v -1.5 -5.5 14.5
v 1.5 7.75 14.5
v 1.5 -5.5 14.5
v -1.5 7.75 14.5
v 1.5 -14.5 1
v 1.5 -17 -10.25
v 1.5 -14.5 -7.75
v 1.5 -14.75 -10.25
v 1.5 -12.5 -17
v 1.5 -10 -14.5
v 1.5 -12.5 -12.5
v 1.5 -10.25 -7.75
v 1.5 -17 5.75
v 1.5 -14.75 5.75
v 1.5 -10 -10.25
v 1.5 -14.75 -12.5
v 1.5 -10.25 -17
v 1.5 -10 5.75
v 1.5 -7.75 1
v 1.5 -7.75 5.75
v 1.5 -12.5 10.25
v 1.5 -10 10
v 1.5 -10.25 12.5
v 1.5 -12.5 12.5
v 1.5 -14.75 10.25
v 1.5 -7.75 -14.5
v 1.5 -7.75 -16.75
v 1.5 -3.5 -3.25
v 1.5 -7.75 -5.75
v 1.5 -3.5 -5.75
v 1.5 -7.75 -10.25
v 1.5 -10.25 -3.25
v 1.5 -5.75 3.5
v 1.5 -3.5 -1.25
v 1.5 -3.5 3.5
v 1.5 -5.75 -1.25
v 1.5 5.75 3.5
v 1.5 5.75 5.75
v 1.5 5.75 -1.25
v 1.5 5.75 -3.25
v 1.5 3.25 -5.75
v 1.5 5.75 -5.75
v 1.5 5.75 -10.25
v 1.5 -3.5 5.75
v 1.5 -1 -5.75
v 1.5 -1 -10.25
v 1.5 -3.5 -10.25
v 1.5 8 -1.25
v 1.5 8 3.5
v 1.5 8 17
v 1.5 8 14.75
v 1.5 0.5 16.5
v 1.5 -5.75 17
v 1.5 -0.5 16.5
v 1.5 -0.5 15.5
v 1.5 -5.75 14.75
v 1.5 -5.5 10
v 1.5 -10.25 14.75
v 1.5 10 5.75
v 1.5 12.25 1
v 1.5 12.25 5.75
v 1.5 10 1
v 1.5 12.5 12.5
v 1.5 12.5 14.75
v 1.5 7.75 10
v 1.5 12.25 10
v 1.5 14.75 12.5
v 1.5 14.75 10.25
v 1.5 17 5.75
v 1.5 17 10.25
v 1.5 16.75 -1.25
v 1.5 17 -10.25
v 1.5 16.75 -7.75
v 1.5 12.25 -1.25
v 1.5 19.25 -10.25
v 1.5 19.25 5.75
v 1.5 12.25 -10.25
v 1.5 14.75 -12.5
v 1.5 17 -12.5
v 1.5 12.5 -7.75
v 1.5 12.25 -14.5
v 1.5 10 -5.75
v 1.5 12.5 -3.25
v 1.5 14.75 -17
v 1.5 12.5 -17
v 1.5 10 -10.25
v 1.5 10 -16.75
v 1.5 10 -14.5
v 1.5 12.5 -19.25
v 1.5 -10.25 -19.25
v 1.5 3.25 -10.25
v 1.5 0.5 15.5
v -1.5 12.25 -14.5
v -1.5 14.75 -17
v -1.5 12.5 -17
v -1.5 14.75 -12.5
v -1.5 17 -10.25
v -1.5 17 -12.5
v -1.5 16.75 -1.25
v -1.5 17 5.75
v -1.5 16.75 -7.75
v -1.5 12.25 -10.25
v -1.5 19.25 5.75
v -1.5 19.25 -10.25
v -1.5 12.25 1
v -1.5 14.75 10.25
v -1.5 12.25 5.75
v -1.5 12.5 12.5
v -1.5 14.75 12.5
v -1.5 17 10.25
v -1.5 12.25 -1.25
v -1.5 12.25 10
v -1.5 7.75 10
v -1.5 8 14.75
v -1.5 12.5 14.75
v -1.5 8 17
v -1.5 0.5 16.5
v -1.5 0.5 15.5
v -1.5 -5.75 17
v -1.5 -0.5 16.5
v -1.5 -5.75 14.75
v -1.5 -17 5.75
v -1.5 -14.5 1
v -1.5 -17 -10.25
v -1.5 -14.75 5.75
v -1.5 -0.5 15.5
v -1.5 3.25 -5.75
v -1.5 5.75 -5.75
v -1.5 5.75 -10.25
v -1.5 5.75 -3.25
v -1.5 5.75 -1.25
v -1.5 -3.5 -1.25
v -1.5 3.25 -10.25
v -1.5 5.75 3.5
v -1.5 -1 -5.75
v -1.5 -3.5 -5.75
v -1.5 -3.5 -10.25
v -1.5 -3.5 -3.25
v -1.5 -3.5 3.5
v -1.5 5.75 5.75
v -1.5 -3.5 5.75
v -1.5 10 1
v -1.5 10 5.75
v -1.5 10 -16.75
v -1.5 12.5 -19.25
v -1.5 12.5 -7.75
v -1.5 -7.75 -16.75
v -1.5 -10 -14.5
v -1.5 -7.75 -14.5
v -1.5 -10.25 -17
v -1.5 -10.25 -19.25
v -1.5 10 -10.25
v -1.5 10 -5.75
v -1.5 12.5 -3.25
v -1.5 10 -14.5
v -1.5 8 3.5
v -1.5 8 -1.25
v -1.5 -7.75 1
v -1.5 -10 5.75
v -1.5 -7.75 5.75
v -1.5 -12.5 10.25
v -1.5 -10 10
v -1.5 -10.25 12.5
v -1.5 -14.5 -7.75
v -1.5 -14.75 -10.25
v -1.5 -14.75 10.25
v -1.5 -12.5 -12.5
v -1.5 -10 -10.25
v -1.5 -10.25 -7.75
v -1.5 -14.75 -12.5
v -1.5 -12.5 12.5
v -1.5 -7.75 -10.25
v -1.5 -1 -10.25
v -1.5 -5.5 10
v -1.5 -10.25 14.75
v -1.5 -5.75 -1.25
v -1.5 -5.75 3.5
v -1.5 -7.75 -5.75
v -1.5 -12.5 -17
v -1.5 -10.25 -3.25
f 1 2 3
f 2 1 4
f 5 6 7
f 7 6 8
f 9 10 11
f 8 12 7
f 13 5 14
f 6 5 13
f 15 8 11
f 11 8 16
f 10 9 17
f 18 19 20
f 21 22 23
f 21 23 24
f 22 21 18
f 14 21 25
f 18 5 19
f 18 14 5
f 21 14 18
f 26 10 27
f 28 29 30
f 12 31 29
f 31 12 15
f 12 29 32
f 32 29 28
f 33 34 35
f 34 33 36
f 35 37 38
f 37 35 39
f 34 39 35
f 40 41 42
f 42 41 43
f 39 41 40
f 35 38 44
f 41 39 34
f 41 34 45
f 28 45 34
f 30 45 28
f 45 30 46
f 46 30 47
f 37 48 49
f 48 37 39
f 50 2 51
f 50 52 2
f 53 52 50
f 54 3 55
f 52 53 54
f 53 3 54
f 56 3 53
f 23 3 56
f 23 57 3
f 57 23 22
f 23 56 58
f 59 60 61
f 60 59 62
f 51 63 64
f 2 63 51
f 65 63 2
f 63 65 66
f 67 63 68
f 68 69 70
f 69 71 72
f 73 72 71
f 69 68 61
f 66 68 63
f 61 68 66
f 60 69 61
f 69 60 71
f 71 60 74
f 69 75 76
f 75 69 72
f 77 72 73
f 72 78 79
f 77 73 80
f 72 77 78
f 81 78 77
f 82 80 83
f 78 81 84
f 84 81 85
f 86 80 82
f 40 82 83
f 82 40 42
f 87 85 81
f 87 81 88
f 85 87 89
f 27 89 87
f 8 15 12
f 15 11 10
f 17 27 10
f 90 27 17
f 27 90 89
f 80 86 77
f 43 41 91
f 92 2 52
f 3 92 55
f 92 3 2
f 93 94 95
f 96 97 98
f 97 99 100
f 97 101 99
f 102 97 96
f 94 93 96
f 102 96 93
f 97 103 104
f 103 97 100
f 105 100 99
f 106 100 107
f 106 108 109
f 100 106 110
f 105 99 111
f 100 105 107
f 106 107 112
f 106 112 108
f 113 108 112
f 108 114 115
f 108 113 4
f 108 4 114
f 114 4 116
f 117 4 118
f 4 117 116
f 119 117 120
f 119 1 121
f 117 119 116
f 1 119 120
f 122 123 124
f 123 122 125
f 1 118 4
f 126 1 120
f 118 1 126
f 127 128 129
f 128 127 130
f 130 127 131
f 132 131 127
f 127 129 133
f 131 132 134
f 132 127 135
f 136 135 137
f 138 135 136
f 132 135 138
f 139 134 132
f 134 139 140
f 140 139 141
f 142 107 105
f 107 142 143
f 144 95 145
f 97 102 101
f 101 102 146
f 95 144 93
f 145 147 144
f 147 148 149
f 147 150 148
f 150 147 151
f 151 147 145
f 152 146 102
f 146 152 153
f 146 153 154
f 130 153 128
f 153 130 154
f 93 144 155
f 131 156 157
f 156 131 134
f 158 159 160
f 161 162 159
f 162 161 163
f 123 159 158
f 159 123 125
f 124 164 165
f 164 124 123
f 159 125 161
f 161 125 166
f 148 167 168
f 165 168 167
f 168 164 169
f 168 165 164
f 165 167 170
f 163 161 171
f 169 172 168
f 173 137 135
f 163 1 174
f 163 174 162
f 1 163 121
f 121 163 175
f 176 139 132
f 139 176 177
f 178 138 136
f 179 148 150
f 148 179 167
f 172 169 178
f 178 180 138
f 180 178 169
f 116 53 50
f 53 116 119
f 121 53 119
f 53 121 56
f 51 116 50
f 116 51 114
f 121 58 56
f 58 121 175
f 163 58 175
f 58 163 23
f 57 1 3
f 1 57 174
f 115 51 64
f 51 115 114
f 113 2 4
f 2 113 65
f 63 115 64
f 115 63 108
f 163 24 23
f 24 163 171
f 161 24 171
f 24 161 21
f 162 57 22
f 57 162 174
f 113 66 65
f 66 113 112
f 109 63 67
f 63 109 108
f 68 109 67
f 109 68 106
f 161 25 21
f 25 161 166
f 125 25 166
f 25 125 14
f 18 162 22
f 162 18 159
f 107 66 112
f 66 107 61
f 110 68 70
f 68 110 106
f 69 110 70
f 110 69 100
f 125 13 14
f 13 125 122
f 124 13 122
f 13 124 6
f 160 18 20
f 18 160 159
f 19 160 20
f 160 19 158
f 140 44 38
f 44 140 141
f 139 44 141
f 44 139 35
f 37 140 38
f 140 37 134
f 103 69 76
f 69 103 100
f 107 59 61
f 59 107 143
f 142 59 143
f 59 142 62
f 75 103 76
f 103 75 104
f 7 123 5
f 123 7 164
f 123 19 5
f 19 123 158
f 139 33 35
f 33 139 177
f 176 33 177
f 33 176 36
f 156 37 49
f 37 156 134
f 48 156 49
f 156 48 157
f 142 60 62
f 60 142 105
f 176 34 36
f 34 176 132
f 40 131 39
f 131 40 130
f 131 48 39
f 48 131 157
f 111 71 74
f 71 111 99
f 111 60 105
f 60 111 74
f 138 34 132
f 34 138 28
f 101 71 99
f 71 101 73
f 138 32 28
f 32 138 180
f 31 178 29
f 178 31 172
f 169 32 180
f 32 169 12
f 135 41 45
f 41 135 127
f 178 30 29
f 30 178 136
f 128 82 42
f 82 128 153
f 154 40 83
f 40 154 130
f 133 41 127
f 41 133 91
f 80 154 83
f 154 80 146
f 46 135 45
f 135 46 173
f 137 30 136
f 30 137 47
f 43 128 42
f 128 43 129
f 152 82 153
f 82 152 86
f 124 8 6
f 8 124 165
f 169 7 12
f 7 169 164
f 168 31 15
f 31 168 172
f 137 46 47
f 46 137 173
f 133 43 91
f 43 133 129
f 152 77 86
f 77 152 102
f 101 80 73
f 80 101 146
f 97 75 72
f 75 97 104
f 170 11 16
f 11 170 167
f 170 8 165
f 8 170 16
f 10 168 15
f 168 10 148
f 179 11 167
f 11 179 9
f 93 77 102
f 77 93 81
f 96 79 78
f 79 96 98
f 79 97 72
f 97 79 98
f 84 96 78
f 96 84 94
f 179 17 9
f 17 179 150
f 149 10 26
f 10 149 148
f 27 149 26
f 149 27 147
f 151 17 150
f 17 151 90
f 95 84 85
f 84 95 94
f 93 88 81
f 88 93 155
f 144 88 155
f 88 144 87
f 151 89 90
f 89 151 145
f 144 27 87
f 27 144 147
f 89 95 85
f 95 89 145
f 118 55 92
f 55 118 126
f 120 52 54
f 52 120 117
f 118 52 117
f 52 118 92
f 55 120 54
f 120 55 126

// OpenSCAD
shape = 6;//[0:Custom,1:SpaceShip,2:Alien1,3:SpaceInvader,4:Heart,5:Bow,6:Mushroom,7:Skull,8:WaitCursor,9:Pacman1,10:Pacman2,11:Potion,12:QuestionMark]

Custom = "[[0,0,0]]";

//Size of the pixel art object
objectSize = 50; 
//Thickness of the pixel art object
objectThickness = 3; 

gridRows = 2*10; //can't find a better to to get the customizer to ignore it 

//Pixel Width
unitWidth = objectSize / gridRows;

holeSize = 1; //resize hole if you set it to 0 there will be no hole
holeLocation = 0; //Change this to move the hole up or down (positive = down, negative = up)
unitLength = unitWidth;
distance = unitWidth;

//Shapes

SpaceShip1 = [[-5,-3,0],[-5,3,0],[-4,-2,0],[-4,2,0],[-3,-1,0],[-3,0,0],[-3,1,0],[-2,-2,0],[-2,-1,0],[-2,0,0],[-2,1,0],[-2,2,0],[-1,-3,0],[-1,-2,0],[-1,-1,0],[-1,0,0],[-1,1,0],[-1,2,0],[-1,3,0],[0,-5,0],[0,-4,0],[0,-3,0],[0,-1,0],[0,1,0],[0,3,0],[0,4,0],[0,5,0],[1,-3,0],[1,-2,0],[1,-1,0],[1,0,0],[1,1,0],[1,2,0],[1,3,0],[2,-2,0],[2,-1,0],[2,0,0],[2,1,0],[2,2,0],[3,-1,0],[3,0,0],[3,1,0],[4,-2,0],[4,2,0],[5,-3,0],[5,3,0]];

Alien1 =[[-6,-2,0],[-6,-1,0],[-6,0,0],[-6,1,0],[-6,2,0],[-5,-2,0],[-5,0,0],[-5,2,0],[-4,-2,0],[-4,-1,0],[-4,0,0],[-4,1,0],[-4,2,0],[-3,0,0],[-2,-3,0],[-2,-2,0],[-2,-1,0],[-2,0,0],[-2,1,0],[-2,2,0],[-2,3,0],[-1,-4,0],[-1,-3,0],[-1,-1,0],[-1,0,0],[-1,1,0],[-1,3,0],[-1,4,0],[0,-4,0],[0,-1,0],[0,0,0],[0,1,0],[0,4,0],[1,-5,0],[1,-4,0],[1,-1,0],[1,0,0],[1,1,0],[1,4,0],[1,5,0],[2,-5,0],[2,-1,0],[2,0,0],[2,1,0],[2,5,0],[3,-1,0],[3,0,0],[3,1,0],[4,-3,0],[4,-2,0],[4,-1,0],[4,0,0],[4,1,0],[4,2,0],[4,3,0],[5,-3,0],[5,3,0],[6,-3,0],[6,3,0],[7,-5,0],[7,-4,0],[7,-3,0],[7,3,0],[7,4,0],[7,5,0]];

Alien2 = [[-4,-4,0],[-4,4,0],[-3,-3,0],[-3,3,0],[-2,-4,0],[-2,-3,0],[-2,-2,0],[-2,-1,0],[-2,0,0],[-2,1,0],[-2,2,0],[-2,3,0],[-2,4,0],[-1,-4,0],[-1,-1,0],[-1,0,0],[-1,1,0],[-1,4,0],[0,-4,0],[0,-1,0],[0,0,0],[0,1,0],[0,4,0],[1,-5,0],[1,-4,0],[1,-1,0],[1,0,0],[1,1,0],[1,4,0],[1,5,0],[2,-6,0],[2,-5,0],[2,-4,0],[2,-3,0],[2,-2,0],[2,-1,0],[2,0,0],[2,1,0],[2,2,0],[2,3,0],[2,4,0],[2,5,0],[2,6,0],[3,-7,0],[3,-6,0],[3,-5,0],[3,-4,0],[3,-3,0],[3,-2,0],[3,-1,0],[3,0,0],[3,1,0],[3,2,0],[3,3,0],[3,4,0],[3,5,0],[3,6,0],[3,7,0],[4,-7,0],[4,-4,0],[4,-3,0],[4,-2,0],[4,-1,0],[4,0,0],[4,1,0],[4,2,0],[4,3,0],[4,4,0],[4,7,0],[5,-7,0],[5,-4,0],[5,4,0],[5,7,0],[6,-3,0],[6,3,0],[7,-2,0],[7,-1,0],[7,1,0],[7,2,0]];


Heart = [[-2,-4,0],[-2,-3,0],[-2,-2,0],[-2,2,0],[-2,3,0],[-2,4,0],[-1,-5,0],[-1,-4,0],[-1,-2,0],[-1,-1,0],[-1,1,0],[-1,2,0],[-1,3,0],[-1,4,0],[-1,5,0],[0,-5,0],[0,-3,0],[0,-2,0],[0,-1,0],[0,0,0],[0,1,0],[0,2,0],[0,3,0],[0,4,0],[0,5,0],[1,-5,0],[1,-3,0],[1,-2,0],[1,-1,0],[1,0,0],[1,1,0],[1,2,0],[1,3,0],[1,4,0],[1,5,0],[2,-5,0],[2,-4,0],[2,-3,0],[2,-2,0],[2,-1,0],[2,0,0],[2,1,0],[2,2,0],[2,3,0],[2,4,0],[2,5,0],[3,-4,0],[3,-3,0],[3,-2,0],[3,-1,0],[3,0,0],[3,1,0],[3,2,0],[3,3,0],[3,4,0],[4,-3,0],[4,-2,0],[4,-1,0],[4,0,0],[4,1,0],[4,2,0],[4,3,0],[5,-2,0],[5,-1,0],[5,0,0],[5,1,0],[5,2,0],[6,-1,0],[6,0,0],[6,1,0],[7,0,0]];

Mushroom1 = [[-9,-2,0],[-9,-1,0],[-9,0,0],[-9,1,0],[-9,2,0],[-9,3,0],[-8,-4,0],[-8,-3,0],[-8,-2,0],[-8,-1,0],[-8,2,0],[-8,3,0],[-8,4,0],[-8,5,0],[-7,-5,0],[-7,-4,0],[-7,-3,0],[-7,-2,0],[-7,-1,0],[-7,2,0],[-7,3,0],[-7,4,0],[-7,5,0],[-7,6,0],[-6,-6,0],[-6,-5,0],[-6,-3,0],[-6,-2,0],[-6,3,0],[-6,4,0],[-6,6,0],[-6,7,0],[-5,-6,0],[-5,7,0],[-4,-7,0],[-4,-6,0],[-4,-5,0],[-4,6,0],[-4,7,0],[-4,8,0],[-3,-7,0],[-3,-6,0],[-3,-5,0],[-3,-4,0],[-3,5,0],[-3,6,0],[-3,7,0],[-3,8,0],[-2,-7,0],[-2,-6,0],[-2,-5,0],[-2,-4,0],[-2,-1,0],[-2,0,0],[-2,1,0],[-2,2,0],[-2,5,0],[-2,6,0],[-2,7,0],[-2,8,0],[-1,-7,0],[-1,-6,0],[-1,-5,0],[-1,-1,0],[-1,0,0],[-1,1,0],[-1,2,0],[-1,6,0],[-1,7,0],[-1,8,0],[0,-7,0],[0,-6,0],[0,-5,0],[0,-2,0],[0,-1,0],[0,0,0],[0,1,0],[0,2,0],[0,3,0],[0,6,0],[0,7,0],[0,8,0],[1,-7,0],[1,-1,0],[1,0,0],[1,1,0],[1,2,0],[1,8,0],[2,-7,0],[2,-4,0],[2,-3,0],[2,-2,0],[2,-1,0],[2,0,0],[2,1,0],[2,2,0],[2,3,0],[2,4,0],[2,5,0],[2,8,0],[3,-7,0],[3,-4,0],[3,-1,0],[3,2,0],[3,5,0],[3,8,0],[4,-7,0],[4,-6,0],[4,-5,0],[4,-1,0],[4,2,0],[4,6,0],[4,7,0],[4,8,0],[5,-6,0],[5,-5,0],[5,6,0],[5,7,0],[6,-5,0],[6,6,0],[7,-5,0],[7,-4,0],[7,5,0],[7,6,0],[8,-4,0],[8,-3,0],[8,-2,0],[8,-1,0],[8,0,0],[8,1,0],[8,2,0],[8,3,0],[8,4,0],[8,5,0]];;

Mushroom2 = [[-7,-2,0],[-7,-1,0],[-7,0,0],[-7,1,0],[-7,2,0],[-7,3,0],[-6,-4,0],[-6,-3,0],[-6,4,0],[-6,5,0],[-5,-5,0],[-5,-4,0],[-5,-3,0],[-5,4,0],[-5,5,0],[-5,6,0],[-4,-6,0],[-4,-5,0],[-4,6,0],[-4,7,0],[-3,-6,0],[-3,-5,0],[-3,6,0],[-3,7,0],[-2,-7,0],[-2,-6,0],[-2,-5,0],[-2,-4,0],[-2,-1,0],[-2,0,0],[-2,1,0],[-2,2,0],[-2,5,0],[-2,6,0],[-2,7,0],[-2,8,0],[-1,-7,0],[-1,-6,0],[-1,-5,0],[-1,-4,0],[-1,-2,0],[-1,-1,0],[-1,0,0],[-1,1,0],[-1,2,0],[-1,3,0],[-1,5,0],[-1,6,0],[-1,7,0],[-1,8,0],[0,-7,0],[0,-2,0],[0,-1,0],[0,0,0],[0,1,0],[0,2,0],[0,3,0],[0,6,0],[0,7,0],[0,8,0],[1,-7,0],[1,-1,0],[1,0,0],[1,1,0],[1,2,0],[1,8,0],[2,-7,0],[2,-4,0],[2,-3,0],[2,-2,0],[2,-1,0],[2,0,0],[2,1,0],[2,2,0],[2,3,0],[2,4,0],[2,5,0],[2,8,0],[3,-7,0],[3,-4,0],[3,-1,0],[3,2,0],[3,5,0],[3,8,0],[4,-7,0],[4,-6,0],[4,-5,0],[4,-4,0],[4,-1,0],[4,2,0],[4,5,0],[4,6,0],[4,7,0],[4,8,0],[5,-6,0],[5,-5,0],[5,6,0],[5,7,0],[6,-5,0],[6,6,0],[7,-5,0],[7,-4,0],[7,5,0],[7,6,0],[8,-4,0],[8,-3,0],[8,-2,0],[8,-1,0],[8,0,0],[8,1,0],[8,2,0],[8,3,0],[8,4,0],[8,5,0]];


Skull1=[[-4,-3,0],[-4,-2,0],[-4,-1,0],[-4,0,0],[-4,1,0],[-4,2,0],[-4,3,0],[-3,-4,0],[-3,-3,0],[-3,-2,0],[-3,-1,0],[-3,0,0],[-3,1,0],[-3,2,0],[-3,3,0],[-3,4,0],[-2,-5,0],[-2,-4,0],[-2,-3,0],[-2,-2,0],[-2,-1,0],[-2,0,0],[-2,1,0],[-2,2,0],[-2,3,0],[-2,4,0],[-2,5,0],[-1,-5,0],[-1,-4,0],[-1,0,0],[-1,4,0],[-1,5,0],[0,-5,0],[0,-4,0],[0,0,0],[0,4,0],[0,5,0],[1,-5,0],[1,-4,0],[1,0,0],[1,4,0],[1,5,0],[2,-5,0],[2,-4,0],[2,-3,0],[2,-2,0],[2,-1,0],[2,0,0],[2,1,0],[2,2,0],[2,3,0],[2,4,0],[2,5,0],[3,-4,0],[3,-3,0],[3,-1,0],[3,1,0],[3,3,0],[3,4,0],[4,-3,0],[4,-1,0],[4,1,0],[4,3,0],[5,-3,0],[5,-1,0],[5,1,0],[5,3,0],[6,-3,0],[6,-1,0],[6,1,0],[6,3,0],[7,-3,0],[7,-2,0],[7,-1,0],[7,0,0],[7,1,0],[7,2,0],[7,3,0]];


Wait1= [[-10,-5,0],[-10,-4,0],[-10,-3,0],[-10,-2,0],[-10,-1,0],[-10,0,0],[-10,1,0],[-10,2,0],[-10,3,0],[-10,4,0],[-10,5,0],[-9,-5,0],[-9,5,0],[-8,-5,0],[-8,-4,0],[-8,-3,0],[-8,-2,0],[-8,-1,0],[-8,0,0],[-8,1,0],[-8,2,0],[-8,3,0],[-8,4,0],[-8,5,0],[-7,-4,0],[-7,4,0],[-6,-4,0],[-6,-2,0],[-6,0,0],[-6,2,0],[-6,4,0],[-5,-4,0],[-5,-1,0],[-5,1,0],[-5,4,0],[-4,-4,0],[-4,0,0],[-4,4,0],[-3,-4,0],[-3,4,0],[-2,-3,0],[-2,-2,0],[-2,0,0],[-2,2,0],[-2,3,0],[-1,-2,0],[-1,-1,0],[-1,1,0],[-1,2,0],[0,-1,0],[0,1,0],[1,-2,0],[1,-1,0],[1,1,0],[1,2,0],[2,-3,0],[2,-2,0],[2,0,0],[2,2,0],[2,3,0],[3,-4,0],[3,4,0],[4,-4,0],[4,0,0],[4,4,0],[5,-4,0],[5,-1,0],[5,1,0],[5,4,0],[6,-4,0],[6,-2,0],[6,0,0],[6,2,0],[6,4,0],[7,-5,0],[7,-4,0],[7,-3,0],[7,-2,0],[7,-1,0],[7,0,0],[7,1,0],[7,2,0],[7,3,0],[7,4,0],[7,5,0],[8,-5,0],[8,5,0],[9,-5,0],[9,-4,0],[9,-3,0],[9,-2,0],[9,-1,0],[9,0,0],[9,1,0],[9,2,0],[9,3,0],[9,4,0],[9,5,0]];

Pacman1 =[[-6,-2,0],[-6,-1,0],[-6,0,0],[-6,1,0],[-6,2,0],[-5,-4,0],[-5,-3,0],[-5,-2,0],[-5,-1,0],[-5,0,0],[-5,1,0],[-5,2,0],[-5,3,0],[-5,4,0],[-4,-5,0],[-4,-4,0],[-4,-3,0],[-4,-2,0],[-4,-1,0],[-4,0,0],[-4,1,0],[-4,2,0],[-4,3,0],[-4,4,0],[-4,5,0],[-3,-5,0],[-3,-4,0],[-3,-3,0],[-3,-2,0],[-3,-1,0],[-3,0,0],[-3,1,0],[-3,2,0],[-3,3,0],[-3,4,0],[-3,5,0],[-2,-6,0],[-2,-5,0],[-2,-4,0],[-2,-3,0],[-2,-2,0],[-2,-1,0],[-2,0,0],[-2,1,0],[-2,2,0],[-2,3,0],[-1,-6,0],[-1,-5,0],[-1,-4,0],[-1,-3,0],[-1,-2,0],[-1,-1,0],[-1,0,0],[0,-6,0],[0,-5,0],[0,-4,0],[0,-3,0],[0,-2,0],[1,-6,0],[1,-5,0],[1,-4,0],[1,-3,0],[1,-2,0],[1,-1,0],[1,0,0],[2,-6,0],[2,-5,0],[2,-4,0],[2,-3,0],[2,-2,0],[2,-1,0],[2,0,0],[2,1,0],[2,2,0],[2,3,0],[3,-5,0],[3,-4,0],[3,-3,0],[3,-2,0],[3,-1,0],[3,0,0],[3,1,0],[3,2,0],[3,3,0],[3,4,0],[3,5,0],[4,-5,0],[4,-4,0],[4,-3,0],[4,-2,0],[4,-1,0],[4,0,0],[4,1,0],[4,2,0],[4,3,0],[4,4,0],[4,5,0],[5,-4,0],[5,-3,0],[5,-2,0],[5,-1,0],[5,0,0],[5,1,0],[5,2,0],[5,3,0],[5,4,0],[6,-2,0],[6,-1,0],[6,0,0],[6,1,0],[6,2,0]];

Pacman2 = [[-10,-3,0],[-10,-2,0],[-10,-1,0],[-10,0,0],[-10,1,0],[-10,2,0],[-10,3,0],[-9,-6,0],[-9,-5,0],[-9,-4,0],[-9,-3,0],[-9,-2,0],[-9,-1,0],[-9,0,0],[-9,1,0],[-9,2,0],[-9,3,0],[-9,4,0],[-9,5,0],[-9,6,0],[-8,-6,0],[-8,-5,0],[-8,-4,0],[-8,-3,0],[-8,-2,0],[-8,-1,0],[-8,0,0],[-8,1,0],[-8,2,0],[-8,3,0],[-8,4,0],[-8,5,0],[-8,6,0],[-7,-7,0],[-7,-6,0],[-7,-5,0],[-7,-4,0],[-7,-3,0],[-7,-2,0],[-7,-1,0],[-7,0,0],[-7,1,0],[-7,2,0],[-7,3,0],[-7,4,0],[-7,5,0],[-7,6,0],[-7,7,0],[-6,-8,0],[-6,-7,0],[-6,-6,0],[-6,-5,0],[-6,-4,0],[-6,-3,0],[-6,-2,0],[-6,-1,0],[-6,0,0],[-6,1,0],[-6,2,0],[-6,3,0],[-6,4,0],[-6,5,0],[-6,6,0],[-6,7,0],[-6,8,0],[-5,-8,0],[-5,-7,0],[-5,-6,0],[-5,-5,0],[-5,-4,0],[-5,-3,0],[-5,-2,0],[-5,-1,0],[-5,0,0],[-5,1,0],[-5,2,0],[-5,3,0],[-5,4,0],[-5,5,0],[-5,6,0],[-5,7,0],[-5,8,0],[-4,-8,0],[-4,-7,0],[-4,-6,0],[-4,-2,0],[-4,-1,0],[-4,0,0],[-4,1,0],[-4,2,0],[-4,6,0],[-4,7,0],[-4,8,0],[-3,-9,0],[-3,-8,0],[-3,-7,0],[-3,-1,0],[-3,0,0],[-3,1,0],[-3,7,0],[-3,8,0],[-2,-9,0],[-2,-8,0],[-2,-7,0],[-2,-1,0],[-2,0,0],[-2,1,0],[-2,7,0],[-2,8,0],[-2,9,0],[-1,-9,0],[-1,-8,0],[-1,-7,0],[-1,-5,0],[-1,-4,0],[-1,-3,0],[-1,-1,0],[-1,0,0],[-1,1,0],[-1,3,0],[-1,4,0],[-1,5,0],[-1,7,0],[-1,8,0],[-1,9,0],[0,-9,0],[0,-8,0],[0,-7,0],[0,-5,0],[0,-4,0],[0,-3,0],[0,-1,0],[0,0,0],[0,1,0],[0,3,0],[0,4,0],[0,5,0],[0,7,0],[0,8,0],[0,9,0],[1,-9,0],[1,-8,0],[1,-7,0],[1,-5,0],[1,-4,0],[1,-3,0],[1,-1,0],[1,0,0],[1,1,0],[1,3,0],[1,4,0],[1,5,0],[1,7,0],[1,8,0],[1,9,0],[2,-9,0],[2,-8,0],[2,-7,0],[2,-6,0],[2,-5,0],[2,-4,0],[2,-3,0],[2,-2,0],[2,-1,0],[2,0,0],[2,1,0],[2,2,0],[2,3,0],[2,4,0],[2,5,0],[2,6,0],[2,7,0],[2,8,0],[2,9,0],[3,-9,0],[3,-8,0],[3,-7,0],[3,-6,0],[3,-5,0],[3,-4,0],[3,-3,0],[3,-2,0],[3,-1,0],[3,0,0],[3,1,0],[3,2,0],[3,3,0],[3,4,0],[3,5,0],[3,6,0],[3,7,0],[3,8,0],[3,9,0],[4,-9,0],[4,-8,0],[4,-7,0],[4,-6,0],[4,-5,0],[4,-4,0],[4,-3,0],[4,-2,0],[4,-1,0],[4,0,0],[4,1,0],[4,2,0],[4,3,0],[4,4,0],[4,5,0],[4,6,0],[4,7,0],[4,8,0],[4,9,0],[5,-9,0],[5,-8,0],[5,-7,0],[5,-6,0],[5,-5,0],[5,-4,0],[5,-3,0],[5,-2,0],[5,-1,0],[5,0,0],[5,1,0],[5,2,0],[5,3,0],[5,4,0],[5,5,0],[5,6,0],[5,7,0],[5,8,0],[5,9,0],[6,-9,0],[6,-8,0],[6,-7,0],[6,-6,0],[6,-5,0],[6,-4,0],[6,-3,0],[6,-2,0],[6,-1,0],[6,0,0],[6,1,0],[6,2,0],[6,3,0],[6,4,0],[6,5,0],[6,6,0],[6,7,0],[6,8,0],[6,9,0],[7,-9,0],[7,-8,0],[7,-7,0],[7,-6,0],[7,-5,0],[7,-4,0],[7,-3,0],[7,-2,0],[7,-1,0],[7,0,0],[7,1,0],[7,2,0],[7,3,0],[7,4,0],[7,5,0],[7,6,0],[7,7,0],[7,8,0],[7,9,0],[8,-9,0],[8,-8,0],[8,-7,0],[8,-6,0],[8,-5,0],[8,-2,0],[8,-1,0],[8,0,0],[8,1,0],[8,2,0],[8,5,0],[8,6,0],[8,7,0],[8,8,0],[8,9,0],[9,-8,0],[9,-7,0],[9,-6,0],[9,0,0],[9,6,0],[9,7,0],[9,8,0]];

Bow1 = [[-5,-7,0],[-5,-6,0],[-5,6,0],[-5,7,0],[-4,-8,0],[-4,-5,0],[-4,-4,0],[-4,4,0],[-4,5,0],[-4,8,0],[-3,-8,0],[-3,-3,0],[-3,3,0],[-3,8,0],[-2,-9,0],[-2,-2,0],[-2,-1,0],[-2,0,0],[-2,1,0],[-2,2,0],[-2,9,0],[-1,-9,0],[-1,-4,0],[-1,-2,0],[-1,-1,0],[-1,0,0],[-1,1,0],[-1,2,0],[-1,4,0],[-1,9,0],[0,-9,0],[0,-3,0],[0,-2,0],[0,-1,0],[0,0,0],[0,1,0],[0,2,0],[0,3,0],[0,9,0],[1,-9,0],[1,-4,0],[1,-2,0],[1,-1,0],[1,0,0],[1,1,0],[1,2,0],[1,4,0],[1,9,0],[2,-9,0],[2,-2,0],[2,-1,0],[2,0,0],[2,1,0],[2,2,0],[2,9,0],[3,-8,0],[3,-3,0],[3,3,0],[3,8,0],[4,-8,0],[4,-5,0],[4,-4,0],[4,4,0],[4,5,0],[4,8,0],[5,-7,0],[5,-6,0],[5,6,0],[5,7,0]];;

Potion = [[-10,-3,0],[-10,-2,0],[-10,-1,0],[-10,0,0],[-10,1,0],[-10,2,0],[-10,3,0],[-9,-3,0],[-9,3,0],[-8,-2,0],[-8,2,0],[-7,-2,0],[-7,2,0],[-6,-2,0],[-6,2,0],[-5,-3,0],[-5,3,0],[-4,-3,0],[-4,2,0],[-4,3,0],[-3,-4,0],[-3,-2,0],[-3,3,0],[-3,4,0],[-2,-4,0],[-2,1,0],[-2,4,0],[-1,-5,0],[-1,2,0],[-1,3,0],[-1,4,0],[-1,5,0],[0,-5,0],[0,-1,0],[0,0,0],[0,1,0],[0,2,0],[0,3,0],[0,4,0],[0,5,0],[1,-6,0],[1,-5,0],[1,-4,0],[1,-3,0],[1,-2,0],[1,-1,0],[1,0,0],[1,1,0],[1,2,0],[1,3,0],[1,4,0],[1,5,0],[1,6,0],[2,-6,0],[2,-5,0],[2,-4,0],[2,-3,0],[2,-2,0],[2,-1,0],[2,0,0],[2,1,0],[2,2,0],[2,3,0],[2,4,0],[2,5,0],[2,6,0],[3,-7,0],[3,-6,0],[3,-5,0],[3,-4,0],[3,-3,0],[3,-2,0],[3,-1,0],[3,0,0],[3,1,0],[3,2,0],[3,3,0],[3,4,0],[3,5,0],[3,6,0],[3,7,0],[4,-7,0],[4,-6,0],[4,-5,0],[4,-4,0],[4,-3,0],[4,-2,0],[4,-1,0],[4,0,0],[4,1,0],[4,2,0],[4,3,0],[4,4,0],[4,5,0],[4,6,0],[4,7,0],[5,-8,0],[5,-7,0],[5,-6,0],[5,-5,0],[5,-4,0],[5,-3,0],[5,-2,0],[5,-1,0],[5,0,0],[5,1,0],[5,2,0],[5,3,0],[5,4,0],[5,5,0],[5,6,0],[5,7,0],[5,8,0],[6,-8,0],[6,-7,0],[6,-6,0],[6,-5,0],[6,-4,0],[6,-3,0],[6,-2,0],[6,-1,0],[6,0,0],[6,1,0],[6,2,0],[6,3,0],[6,4,0],[6,5,0],[6,6,0],[6,7,0],[6,8,0],[7,-9,0],[7,-8,0],[7,-7,0],[7,-6,0],[7,-5,0],[7,-4,0],[7,-3,0],[7,-2,0],[7,-1,0],[7,0,0],[7,1,0],[7,2,0],[7,3,0],[7,4,0],[7,5,0],[7,6,0],[7,7,0],[7,8,0],[7,9,0],[8,-9,0],[8,-8,0],[8,-7,0],[8,-6,0],[8,-5,0],[8,-4,0],[8,-3,0],[8,-2,0],[8,-1,0],[8,0,0],[8,1,0],[8,2,0],[8,3,0],[8,4,0],[8,5,0],[8,6,0],[8,7,0],[8,8,0],[8,9,0],[9,-8,0],[9,-7,0],[9,-6,0],[9,-5,0],[9,-4,0],[9,-3,0],[9,-2,0],[9,-1,0],[9,0,0],[9,1,0],[9,2,0],[9,3,0],[9,4,0],[9,5,0],[9,6,0],[9,7,0],[9,8,0]];


QuestionMark = [[-8,-9,0],[-8,-8,0],[-8,-7,0],[-8,-6,0],[-8,-5,0],[-8,-4,0],[-8,-3,0],[-8,-2,0],[-8,-1,0],[-8,0,0],[-8,1,0],[-8,2,0],[-8,3,0],[-8,4,0],[-8,5,0],[-8,6,0],[-8,7,0],[-8,8,0],[-7,-9,0],[-7,-7,0],[-7,-6,0],[-7,-5,0],[-7,-4,0],[-7,-3,0],[-7,-2,0],[-7,-1,0],[-7,0,0],[-7,1,0],[-7,2,0],[-7,3,0],[-7,4,0],[-7,5,0],[-7,6,0],[-7,8,0],[-6,-9,0],[-6,-8,0],[-6,-7,0],[-6,-6,0],[-6,-5,0],[-6,-4,0],[-6,-3,0],[-6,-2,0],[-6,-1,0],[-6,0,0],[-6,1,0],[-6,2,0],[-6,3,0],[-6,4,0],[-6,5,0],[-6,6,0],[-6,7,0],[-6,8,0],[-5,-9,0],[-5,-8,0],[-5,-7,0],[-5,-6,0],[-5,-5,0],[-5,-4,0],[-5,-3,0],[-5,-2,0],[-5,-1,0],[-5,0,0],[-5,1,0],[-5,2,0],[-5,3,0],[-5,4,0],[-5,5,0],[-5,6,0],[-5,7,0],[-5,8,0],[-4,-9,0],[-4,-8,0],[-4,-7,0],[-4,-6,0],[-4,-5,0],[-4,-4,0],[-4,3,0],[-4,4,0],[-4,5,0],[-4,6,0],[-4,7,0],[-4,8,0],[-3,-9,0],[-3,-8,0],[-3,-7,0],[-3,-6,0],[-3,-5,0],[-3,-2,0],[-3,-1,0],[-3,0,0],[-3,1,0],[-3,4,0],[-3,5,0],[-3,6,0],[-3,7,0],[-3,8,0],[-2,-9,0],[-2,-8,0],[-2,-7,0],[-2,-6,0],[-2,-5,0],[-2,-2,0],[-2,-1,0],[-2,0,0],[-2,1,0],[-2,4,0],[-2,5,0],[-2,6,0],[-2,7,0],[-2,8,0],[-1,-9,0],[-1,-8,0],[-1,-7,0],[-1,-6,0],[-1,-5,0],[-1,-2,0],[-1,-1,0],[-1,0,0],[-1,1,0],[-1,4,0],[-1,5,0],[-1,6,0],[-1,7,0],[-1,8,0],[0,-9,0],[0,-8,0],[0,-7,0],[0,-6,0],[0,-5,0],[0,-2,0],[0,-1,0],[0,0,0],[0,1,0],[0,4,0],[0,5,0],[0,6,0],[0,7,0],[0,8,0],[1,-9,0],[1,-8,0],[1,-7,0],[1,-6,0],[1,-5,0],[1,-4,0],[1,-3,0],[1,-2,0],[1,-1,0],[1,0,0],[1,4,0],[1,5,0],[1,6,0],[1,7,0],[1,8,0],[2,-9,0],[2,-8,0],[2,-7,0],[2,-6,0],[2,-5,0],[2,-4,0],[2,-3,0],[2,-2,0],[2,-1,0],[2,0,0],[2,2,0],[2,3,0],[2,4,0],[2,5,0],[2,6,0],[2,7,0],[2,8,0],[3,-9,0],[3,-8,0],[3,-7,0],[3,-6,0],[3,-5,0],[3,-4,0],[3,-3,0],[3,-2,0],[3,-1,0],[3,2,0],[3,3,0],[3,4,0],[3,5,0],[3,6,0],[3,7,0],[3,8,0],[4,-9,0],[4,-8,0],[4,-7,0],[4,-6,0],[4,-5,0],[4,-4,0],[4,-3,0],[4,-2,0],[4,-1,0],[4,2,0],[4,3,0],[4,4,0],[4,5,0],[4,6,0],[4,7,0],[4,8,0],[5,-9,0],[5,-8,0],[5,-7,0],[5,-6,0],[5,-5,0],[5,-4,0],[5,-3,0],[5,-2,0],[5,-1,0],[5,0,0],[5,1,0],[5,2,0],[5,3,0],[5,4,0],[5,5,0],[5,6,0],[5,7,0],[5,8,0],[6,-9,0],[6,-8,0],[6,-7,0],[6,-6,0],[6,-5,0],[6,-4,0],[6,-3,0],[6,-2,0],[6,-1,0],[6,2,0],[6,3,0],[6,4,0],[6,5,0],[6,6,0],[6,7,0],[6,8,0],[7,-9,0],[7,-8,0],[7,-7,0],[7,-6,0],[7,-5,0],[7,-4,0],[7,-3,0],[7,-2,0],[7,-1,0],[7,2,0],[7,3,0],[7,4,0],[7,5,0],[7,6,0],[7,7,0],[7,8,0],[8,-9,0],[8,-7,0],[8,-6,0],[8,-5,0],[8,-4,0],[8,-3,0],[8,-2,0],[8,-1,0],[8,0,0],[8,1,0],[8,2,0],[8,3,0],[8,4,0],[8,5,0],[8,6,0],[8,8,0],[9,-9,0],[9,-8,0],[9,-7,0],[9,-6,0],[9,-5,0],[9,-4,0],[9,-3,0],[9,-2,0],[9,-1,0],[9,0,0],[9,1,0],[9,2,0],[9,3,0],[9,4,0],[9,5,0],[9,6,0],[9,7,0],[9,8,0]];
//You can enter you own shape array here:



//Draw the shape we chose
if (shape == 1)
{
	pixel(SpaceShip1, -6);
}
else if (shape == 2)
{ 
	color("Blue")
	pixel(Alien1, -14);
}
else if (shape == 3)
{
	color("Blue")
	pixel(Alien2, -4.5);
}
else if(shape == 4)
{
	color("red")
	pixel(Heart, 0);
}

else if (shape == 5)
{
	color("red")
	pixel(Bow1, -4);
}

else if (shape == 6)
{
	color("green")
	pixel(Mushroom2, -16);
}

else if (shape == 7)
{
	color("black")
	pixel(Skull1, -8);
}

else if(shape == 8)
{
	color("black")
	pixel(Wait1, -22.5);
}
else if(shape == 9)
{
	pixel(Pacman1, -13);
}
else if(shape == 10)
{
	color("red")
	pixel(Pacman2, -22);
}
else if(shape == 11)
{
	color("blue")
	pixel(Potion, -22.5);
}
else if(shape == 12)
{
	color("green")
	pixel(QuestionMark, -17);
}
else if(shape == 0)
{
	color("red")
	pixel(Custom, -5);
}


//Draw the pixel shape
module pixel(num, holeHight)
{
	rotate(a=[0,90,0])
	{
		difference()
		{
				union()
				{
	 					for(i = num)
    					{
     					translate(i*distance*0.9) //the 0.9 guarantees some overlap
     					cube([unitLength, unitWidth, objectThickness], center = true);  
    					}
				}
		
				translate([holeHight + holeLocation,0,0])
				{
					rotate(a=[0,0,0])
					{
						cube([holeSize, holeSize, objectThickness * 2], center = true);
					}
				}
		}
	}
}
